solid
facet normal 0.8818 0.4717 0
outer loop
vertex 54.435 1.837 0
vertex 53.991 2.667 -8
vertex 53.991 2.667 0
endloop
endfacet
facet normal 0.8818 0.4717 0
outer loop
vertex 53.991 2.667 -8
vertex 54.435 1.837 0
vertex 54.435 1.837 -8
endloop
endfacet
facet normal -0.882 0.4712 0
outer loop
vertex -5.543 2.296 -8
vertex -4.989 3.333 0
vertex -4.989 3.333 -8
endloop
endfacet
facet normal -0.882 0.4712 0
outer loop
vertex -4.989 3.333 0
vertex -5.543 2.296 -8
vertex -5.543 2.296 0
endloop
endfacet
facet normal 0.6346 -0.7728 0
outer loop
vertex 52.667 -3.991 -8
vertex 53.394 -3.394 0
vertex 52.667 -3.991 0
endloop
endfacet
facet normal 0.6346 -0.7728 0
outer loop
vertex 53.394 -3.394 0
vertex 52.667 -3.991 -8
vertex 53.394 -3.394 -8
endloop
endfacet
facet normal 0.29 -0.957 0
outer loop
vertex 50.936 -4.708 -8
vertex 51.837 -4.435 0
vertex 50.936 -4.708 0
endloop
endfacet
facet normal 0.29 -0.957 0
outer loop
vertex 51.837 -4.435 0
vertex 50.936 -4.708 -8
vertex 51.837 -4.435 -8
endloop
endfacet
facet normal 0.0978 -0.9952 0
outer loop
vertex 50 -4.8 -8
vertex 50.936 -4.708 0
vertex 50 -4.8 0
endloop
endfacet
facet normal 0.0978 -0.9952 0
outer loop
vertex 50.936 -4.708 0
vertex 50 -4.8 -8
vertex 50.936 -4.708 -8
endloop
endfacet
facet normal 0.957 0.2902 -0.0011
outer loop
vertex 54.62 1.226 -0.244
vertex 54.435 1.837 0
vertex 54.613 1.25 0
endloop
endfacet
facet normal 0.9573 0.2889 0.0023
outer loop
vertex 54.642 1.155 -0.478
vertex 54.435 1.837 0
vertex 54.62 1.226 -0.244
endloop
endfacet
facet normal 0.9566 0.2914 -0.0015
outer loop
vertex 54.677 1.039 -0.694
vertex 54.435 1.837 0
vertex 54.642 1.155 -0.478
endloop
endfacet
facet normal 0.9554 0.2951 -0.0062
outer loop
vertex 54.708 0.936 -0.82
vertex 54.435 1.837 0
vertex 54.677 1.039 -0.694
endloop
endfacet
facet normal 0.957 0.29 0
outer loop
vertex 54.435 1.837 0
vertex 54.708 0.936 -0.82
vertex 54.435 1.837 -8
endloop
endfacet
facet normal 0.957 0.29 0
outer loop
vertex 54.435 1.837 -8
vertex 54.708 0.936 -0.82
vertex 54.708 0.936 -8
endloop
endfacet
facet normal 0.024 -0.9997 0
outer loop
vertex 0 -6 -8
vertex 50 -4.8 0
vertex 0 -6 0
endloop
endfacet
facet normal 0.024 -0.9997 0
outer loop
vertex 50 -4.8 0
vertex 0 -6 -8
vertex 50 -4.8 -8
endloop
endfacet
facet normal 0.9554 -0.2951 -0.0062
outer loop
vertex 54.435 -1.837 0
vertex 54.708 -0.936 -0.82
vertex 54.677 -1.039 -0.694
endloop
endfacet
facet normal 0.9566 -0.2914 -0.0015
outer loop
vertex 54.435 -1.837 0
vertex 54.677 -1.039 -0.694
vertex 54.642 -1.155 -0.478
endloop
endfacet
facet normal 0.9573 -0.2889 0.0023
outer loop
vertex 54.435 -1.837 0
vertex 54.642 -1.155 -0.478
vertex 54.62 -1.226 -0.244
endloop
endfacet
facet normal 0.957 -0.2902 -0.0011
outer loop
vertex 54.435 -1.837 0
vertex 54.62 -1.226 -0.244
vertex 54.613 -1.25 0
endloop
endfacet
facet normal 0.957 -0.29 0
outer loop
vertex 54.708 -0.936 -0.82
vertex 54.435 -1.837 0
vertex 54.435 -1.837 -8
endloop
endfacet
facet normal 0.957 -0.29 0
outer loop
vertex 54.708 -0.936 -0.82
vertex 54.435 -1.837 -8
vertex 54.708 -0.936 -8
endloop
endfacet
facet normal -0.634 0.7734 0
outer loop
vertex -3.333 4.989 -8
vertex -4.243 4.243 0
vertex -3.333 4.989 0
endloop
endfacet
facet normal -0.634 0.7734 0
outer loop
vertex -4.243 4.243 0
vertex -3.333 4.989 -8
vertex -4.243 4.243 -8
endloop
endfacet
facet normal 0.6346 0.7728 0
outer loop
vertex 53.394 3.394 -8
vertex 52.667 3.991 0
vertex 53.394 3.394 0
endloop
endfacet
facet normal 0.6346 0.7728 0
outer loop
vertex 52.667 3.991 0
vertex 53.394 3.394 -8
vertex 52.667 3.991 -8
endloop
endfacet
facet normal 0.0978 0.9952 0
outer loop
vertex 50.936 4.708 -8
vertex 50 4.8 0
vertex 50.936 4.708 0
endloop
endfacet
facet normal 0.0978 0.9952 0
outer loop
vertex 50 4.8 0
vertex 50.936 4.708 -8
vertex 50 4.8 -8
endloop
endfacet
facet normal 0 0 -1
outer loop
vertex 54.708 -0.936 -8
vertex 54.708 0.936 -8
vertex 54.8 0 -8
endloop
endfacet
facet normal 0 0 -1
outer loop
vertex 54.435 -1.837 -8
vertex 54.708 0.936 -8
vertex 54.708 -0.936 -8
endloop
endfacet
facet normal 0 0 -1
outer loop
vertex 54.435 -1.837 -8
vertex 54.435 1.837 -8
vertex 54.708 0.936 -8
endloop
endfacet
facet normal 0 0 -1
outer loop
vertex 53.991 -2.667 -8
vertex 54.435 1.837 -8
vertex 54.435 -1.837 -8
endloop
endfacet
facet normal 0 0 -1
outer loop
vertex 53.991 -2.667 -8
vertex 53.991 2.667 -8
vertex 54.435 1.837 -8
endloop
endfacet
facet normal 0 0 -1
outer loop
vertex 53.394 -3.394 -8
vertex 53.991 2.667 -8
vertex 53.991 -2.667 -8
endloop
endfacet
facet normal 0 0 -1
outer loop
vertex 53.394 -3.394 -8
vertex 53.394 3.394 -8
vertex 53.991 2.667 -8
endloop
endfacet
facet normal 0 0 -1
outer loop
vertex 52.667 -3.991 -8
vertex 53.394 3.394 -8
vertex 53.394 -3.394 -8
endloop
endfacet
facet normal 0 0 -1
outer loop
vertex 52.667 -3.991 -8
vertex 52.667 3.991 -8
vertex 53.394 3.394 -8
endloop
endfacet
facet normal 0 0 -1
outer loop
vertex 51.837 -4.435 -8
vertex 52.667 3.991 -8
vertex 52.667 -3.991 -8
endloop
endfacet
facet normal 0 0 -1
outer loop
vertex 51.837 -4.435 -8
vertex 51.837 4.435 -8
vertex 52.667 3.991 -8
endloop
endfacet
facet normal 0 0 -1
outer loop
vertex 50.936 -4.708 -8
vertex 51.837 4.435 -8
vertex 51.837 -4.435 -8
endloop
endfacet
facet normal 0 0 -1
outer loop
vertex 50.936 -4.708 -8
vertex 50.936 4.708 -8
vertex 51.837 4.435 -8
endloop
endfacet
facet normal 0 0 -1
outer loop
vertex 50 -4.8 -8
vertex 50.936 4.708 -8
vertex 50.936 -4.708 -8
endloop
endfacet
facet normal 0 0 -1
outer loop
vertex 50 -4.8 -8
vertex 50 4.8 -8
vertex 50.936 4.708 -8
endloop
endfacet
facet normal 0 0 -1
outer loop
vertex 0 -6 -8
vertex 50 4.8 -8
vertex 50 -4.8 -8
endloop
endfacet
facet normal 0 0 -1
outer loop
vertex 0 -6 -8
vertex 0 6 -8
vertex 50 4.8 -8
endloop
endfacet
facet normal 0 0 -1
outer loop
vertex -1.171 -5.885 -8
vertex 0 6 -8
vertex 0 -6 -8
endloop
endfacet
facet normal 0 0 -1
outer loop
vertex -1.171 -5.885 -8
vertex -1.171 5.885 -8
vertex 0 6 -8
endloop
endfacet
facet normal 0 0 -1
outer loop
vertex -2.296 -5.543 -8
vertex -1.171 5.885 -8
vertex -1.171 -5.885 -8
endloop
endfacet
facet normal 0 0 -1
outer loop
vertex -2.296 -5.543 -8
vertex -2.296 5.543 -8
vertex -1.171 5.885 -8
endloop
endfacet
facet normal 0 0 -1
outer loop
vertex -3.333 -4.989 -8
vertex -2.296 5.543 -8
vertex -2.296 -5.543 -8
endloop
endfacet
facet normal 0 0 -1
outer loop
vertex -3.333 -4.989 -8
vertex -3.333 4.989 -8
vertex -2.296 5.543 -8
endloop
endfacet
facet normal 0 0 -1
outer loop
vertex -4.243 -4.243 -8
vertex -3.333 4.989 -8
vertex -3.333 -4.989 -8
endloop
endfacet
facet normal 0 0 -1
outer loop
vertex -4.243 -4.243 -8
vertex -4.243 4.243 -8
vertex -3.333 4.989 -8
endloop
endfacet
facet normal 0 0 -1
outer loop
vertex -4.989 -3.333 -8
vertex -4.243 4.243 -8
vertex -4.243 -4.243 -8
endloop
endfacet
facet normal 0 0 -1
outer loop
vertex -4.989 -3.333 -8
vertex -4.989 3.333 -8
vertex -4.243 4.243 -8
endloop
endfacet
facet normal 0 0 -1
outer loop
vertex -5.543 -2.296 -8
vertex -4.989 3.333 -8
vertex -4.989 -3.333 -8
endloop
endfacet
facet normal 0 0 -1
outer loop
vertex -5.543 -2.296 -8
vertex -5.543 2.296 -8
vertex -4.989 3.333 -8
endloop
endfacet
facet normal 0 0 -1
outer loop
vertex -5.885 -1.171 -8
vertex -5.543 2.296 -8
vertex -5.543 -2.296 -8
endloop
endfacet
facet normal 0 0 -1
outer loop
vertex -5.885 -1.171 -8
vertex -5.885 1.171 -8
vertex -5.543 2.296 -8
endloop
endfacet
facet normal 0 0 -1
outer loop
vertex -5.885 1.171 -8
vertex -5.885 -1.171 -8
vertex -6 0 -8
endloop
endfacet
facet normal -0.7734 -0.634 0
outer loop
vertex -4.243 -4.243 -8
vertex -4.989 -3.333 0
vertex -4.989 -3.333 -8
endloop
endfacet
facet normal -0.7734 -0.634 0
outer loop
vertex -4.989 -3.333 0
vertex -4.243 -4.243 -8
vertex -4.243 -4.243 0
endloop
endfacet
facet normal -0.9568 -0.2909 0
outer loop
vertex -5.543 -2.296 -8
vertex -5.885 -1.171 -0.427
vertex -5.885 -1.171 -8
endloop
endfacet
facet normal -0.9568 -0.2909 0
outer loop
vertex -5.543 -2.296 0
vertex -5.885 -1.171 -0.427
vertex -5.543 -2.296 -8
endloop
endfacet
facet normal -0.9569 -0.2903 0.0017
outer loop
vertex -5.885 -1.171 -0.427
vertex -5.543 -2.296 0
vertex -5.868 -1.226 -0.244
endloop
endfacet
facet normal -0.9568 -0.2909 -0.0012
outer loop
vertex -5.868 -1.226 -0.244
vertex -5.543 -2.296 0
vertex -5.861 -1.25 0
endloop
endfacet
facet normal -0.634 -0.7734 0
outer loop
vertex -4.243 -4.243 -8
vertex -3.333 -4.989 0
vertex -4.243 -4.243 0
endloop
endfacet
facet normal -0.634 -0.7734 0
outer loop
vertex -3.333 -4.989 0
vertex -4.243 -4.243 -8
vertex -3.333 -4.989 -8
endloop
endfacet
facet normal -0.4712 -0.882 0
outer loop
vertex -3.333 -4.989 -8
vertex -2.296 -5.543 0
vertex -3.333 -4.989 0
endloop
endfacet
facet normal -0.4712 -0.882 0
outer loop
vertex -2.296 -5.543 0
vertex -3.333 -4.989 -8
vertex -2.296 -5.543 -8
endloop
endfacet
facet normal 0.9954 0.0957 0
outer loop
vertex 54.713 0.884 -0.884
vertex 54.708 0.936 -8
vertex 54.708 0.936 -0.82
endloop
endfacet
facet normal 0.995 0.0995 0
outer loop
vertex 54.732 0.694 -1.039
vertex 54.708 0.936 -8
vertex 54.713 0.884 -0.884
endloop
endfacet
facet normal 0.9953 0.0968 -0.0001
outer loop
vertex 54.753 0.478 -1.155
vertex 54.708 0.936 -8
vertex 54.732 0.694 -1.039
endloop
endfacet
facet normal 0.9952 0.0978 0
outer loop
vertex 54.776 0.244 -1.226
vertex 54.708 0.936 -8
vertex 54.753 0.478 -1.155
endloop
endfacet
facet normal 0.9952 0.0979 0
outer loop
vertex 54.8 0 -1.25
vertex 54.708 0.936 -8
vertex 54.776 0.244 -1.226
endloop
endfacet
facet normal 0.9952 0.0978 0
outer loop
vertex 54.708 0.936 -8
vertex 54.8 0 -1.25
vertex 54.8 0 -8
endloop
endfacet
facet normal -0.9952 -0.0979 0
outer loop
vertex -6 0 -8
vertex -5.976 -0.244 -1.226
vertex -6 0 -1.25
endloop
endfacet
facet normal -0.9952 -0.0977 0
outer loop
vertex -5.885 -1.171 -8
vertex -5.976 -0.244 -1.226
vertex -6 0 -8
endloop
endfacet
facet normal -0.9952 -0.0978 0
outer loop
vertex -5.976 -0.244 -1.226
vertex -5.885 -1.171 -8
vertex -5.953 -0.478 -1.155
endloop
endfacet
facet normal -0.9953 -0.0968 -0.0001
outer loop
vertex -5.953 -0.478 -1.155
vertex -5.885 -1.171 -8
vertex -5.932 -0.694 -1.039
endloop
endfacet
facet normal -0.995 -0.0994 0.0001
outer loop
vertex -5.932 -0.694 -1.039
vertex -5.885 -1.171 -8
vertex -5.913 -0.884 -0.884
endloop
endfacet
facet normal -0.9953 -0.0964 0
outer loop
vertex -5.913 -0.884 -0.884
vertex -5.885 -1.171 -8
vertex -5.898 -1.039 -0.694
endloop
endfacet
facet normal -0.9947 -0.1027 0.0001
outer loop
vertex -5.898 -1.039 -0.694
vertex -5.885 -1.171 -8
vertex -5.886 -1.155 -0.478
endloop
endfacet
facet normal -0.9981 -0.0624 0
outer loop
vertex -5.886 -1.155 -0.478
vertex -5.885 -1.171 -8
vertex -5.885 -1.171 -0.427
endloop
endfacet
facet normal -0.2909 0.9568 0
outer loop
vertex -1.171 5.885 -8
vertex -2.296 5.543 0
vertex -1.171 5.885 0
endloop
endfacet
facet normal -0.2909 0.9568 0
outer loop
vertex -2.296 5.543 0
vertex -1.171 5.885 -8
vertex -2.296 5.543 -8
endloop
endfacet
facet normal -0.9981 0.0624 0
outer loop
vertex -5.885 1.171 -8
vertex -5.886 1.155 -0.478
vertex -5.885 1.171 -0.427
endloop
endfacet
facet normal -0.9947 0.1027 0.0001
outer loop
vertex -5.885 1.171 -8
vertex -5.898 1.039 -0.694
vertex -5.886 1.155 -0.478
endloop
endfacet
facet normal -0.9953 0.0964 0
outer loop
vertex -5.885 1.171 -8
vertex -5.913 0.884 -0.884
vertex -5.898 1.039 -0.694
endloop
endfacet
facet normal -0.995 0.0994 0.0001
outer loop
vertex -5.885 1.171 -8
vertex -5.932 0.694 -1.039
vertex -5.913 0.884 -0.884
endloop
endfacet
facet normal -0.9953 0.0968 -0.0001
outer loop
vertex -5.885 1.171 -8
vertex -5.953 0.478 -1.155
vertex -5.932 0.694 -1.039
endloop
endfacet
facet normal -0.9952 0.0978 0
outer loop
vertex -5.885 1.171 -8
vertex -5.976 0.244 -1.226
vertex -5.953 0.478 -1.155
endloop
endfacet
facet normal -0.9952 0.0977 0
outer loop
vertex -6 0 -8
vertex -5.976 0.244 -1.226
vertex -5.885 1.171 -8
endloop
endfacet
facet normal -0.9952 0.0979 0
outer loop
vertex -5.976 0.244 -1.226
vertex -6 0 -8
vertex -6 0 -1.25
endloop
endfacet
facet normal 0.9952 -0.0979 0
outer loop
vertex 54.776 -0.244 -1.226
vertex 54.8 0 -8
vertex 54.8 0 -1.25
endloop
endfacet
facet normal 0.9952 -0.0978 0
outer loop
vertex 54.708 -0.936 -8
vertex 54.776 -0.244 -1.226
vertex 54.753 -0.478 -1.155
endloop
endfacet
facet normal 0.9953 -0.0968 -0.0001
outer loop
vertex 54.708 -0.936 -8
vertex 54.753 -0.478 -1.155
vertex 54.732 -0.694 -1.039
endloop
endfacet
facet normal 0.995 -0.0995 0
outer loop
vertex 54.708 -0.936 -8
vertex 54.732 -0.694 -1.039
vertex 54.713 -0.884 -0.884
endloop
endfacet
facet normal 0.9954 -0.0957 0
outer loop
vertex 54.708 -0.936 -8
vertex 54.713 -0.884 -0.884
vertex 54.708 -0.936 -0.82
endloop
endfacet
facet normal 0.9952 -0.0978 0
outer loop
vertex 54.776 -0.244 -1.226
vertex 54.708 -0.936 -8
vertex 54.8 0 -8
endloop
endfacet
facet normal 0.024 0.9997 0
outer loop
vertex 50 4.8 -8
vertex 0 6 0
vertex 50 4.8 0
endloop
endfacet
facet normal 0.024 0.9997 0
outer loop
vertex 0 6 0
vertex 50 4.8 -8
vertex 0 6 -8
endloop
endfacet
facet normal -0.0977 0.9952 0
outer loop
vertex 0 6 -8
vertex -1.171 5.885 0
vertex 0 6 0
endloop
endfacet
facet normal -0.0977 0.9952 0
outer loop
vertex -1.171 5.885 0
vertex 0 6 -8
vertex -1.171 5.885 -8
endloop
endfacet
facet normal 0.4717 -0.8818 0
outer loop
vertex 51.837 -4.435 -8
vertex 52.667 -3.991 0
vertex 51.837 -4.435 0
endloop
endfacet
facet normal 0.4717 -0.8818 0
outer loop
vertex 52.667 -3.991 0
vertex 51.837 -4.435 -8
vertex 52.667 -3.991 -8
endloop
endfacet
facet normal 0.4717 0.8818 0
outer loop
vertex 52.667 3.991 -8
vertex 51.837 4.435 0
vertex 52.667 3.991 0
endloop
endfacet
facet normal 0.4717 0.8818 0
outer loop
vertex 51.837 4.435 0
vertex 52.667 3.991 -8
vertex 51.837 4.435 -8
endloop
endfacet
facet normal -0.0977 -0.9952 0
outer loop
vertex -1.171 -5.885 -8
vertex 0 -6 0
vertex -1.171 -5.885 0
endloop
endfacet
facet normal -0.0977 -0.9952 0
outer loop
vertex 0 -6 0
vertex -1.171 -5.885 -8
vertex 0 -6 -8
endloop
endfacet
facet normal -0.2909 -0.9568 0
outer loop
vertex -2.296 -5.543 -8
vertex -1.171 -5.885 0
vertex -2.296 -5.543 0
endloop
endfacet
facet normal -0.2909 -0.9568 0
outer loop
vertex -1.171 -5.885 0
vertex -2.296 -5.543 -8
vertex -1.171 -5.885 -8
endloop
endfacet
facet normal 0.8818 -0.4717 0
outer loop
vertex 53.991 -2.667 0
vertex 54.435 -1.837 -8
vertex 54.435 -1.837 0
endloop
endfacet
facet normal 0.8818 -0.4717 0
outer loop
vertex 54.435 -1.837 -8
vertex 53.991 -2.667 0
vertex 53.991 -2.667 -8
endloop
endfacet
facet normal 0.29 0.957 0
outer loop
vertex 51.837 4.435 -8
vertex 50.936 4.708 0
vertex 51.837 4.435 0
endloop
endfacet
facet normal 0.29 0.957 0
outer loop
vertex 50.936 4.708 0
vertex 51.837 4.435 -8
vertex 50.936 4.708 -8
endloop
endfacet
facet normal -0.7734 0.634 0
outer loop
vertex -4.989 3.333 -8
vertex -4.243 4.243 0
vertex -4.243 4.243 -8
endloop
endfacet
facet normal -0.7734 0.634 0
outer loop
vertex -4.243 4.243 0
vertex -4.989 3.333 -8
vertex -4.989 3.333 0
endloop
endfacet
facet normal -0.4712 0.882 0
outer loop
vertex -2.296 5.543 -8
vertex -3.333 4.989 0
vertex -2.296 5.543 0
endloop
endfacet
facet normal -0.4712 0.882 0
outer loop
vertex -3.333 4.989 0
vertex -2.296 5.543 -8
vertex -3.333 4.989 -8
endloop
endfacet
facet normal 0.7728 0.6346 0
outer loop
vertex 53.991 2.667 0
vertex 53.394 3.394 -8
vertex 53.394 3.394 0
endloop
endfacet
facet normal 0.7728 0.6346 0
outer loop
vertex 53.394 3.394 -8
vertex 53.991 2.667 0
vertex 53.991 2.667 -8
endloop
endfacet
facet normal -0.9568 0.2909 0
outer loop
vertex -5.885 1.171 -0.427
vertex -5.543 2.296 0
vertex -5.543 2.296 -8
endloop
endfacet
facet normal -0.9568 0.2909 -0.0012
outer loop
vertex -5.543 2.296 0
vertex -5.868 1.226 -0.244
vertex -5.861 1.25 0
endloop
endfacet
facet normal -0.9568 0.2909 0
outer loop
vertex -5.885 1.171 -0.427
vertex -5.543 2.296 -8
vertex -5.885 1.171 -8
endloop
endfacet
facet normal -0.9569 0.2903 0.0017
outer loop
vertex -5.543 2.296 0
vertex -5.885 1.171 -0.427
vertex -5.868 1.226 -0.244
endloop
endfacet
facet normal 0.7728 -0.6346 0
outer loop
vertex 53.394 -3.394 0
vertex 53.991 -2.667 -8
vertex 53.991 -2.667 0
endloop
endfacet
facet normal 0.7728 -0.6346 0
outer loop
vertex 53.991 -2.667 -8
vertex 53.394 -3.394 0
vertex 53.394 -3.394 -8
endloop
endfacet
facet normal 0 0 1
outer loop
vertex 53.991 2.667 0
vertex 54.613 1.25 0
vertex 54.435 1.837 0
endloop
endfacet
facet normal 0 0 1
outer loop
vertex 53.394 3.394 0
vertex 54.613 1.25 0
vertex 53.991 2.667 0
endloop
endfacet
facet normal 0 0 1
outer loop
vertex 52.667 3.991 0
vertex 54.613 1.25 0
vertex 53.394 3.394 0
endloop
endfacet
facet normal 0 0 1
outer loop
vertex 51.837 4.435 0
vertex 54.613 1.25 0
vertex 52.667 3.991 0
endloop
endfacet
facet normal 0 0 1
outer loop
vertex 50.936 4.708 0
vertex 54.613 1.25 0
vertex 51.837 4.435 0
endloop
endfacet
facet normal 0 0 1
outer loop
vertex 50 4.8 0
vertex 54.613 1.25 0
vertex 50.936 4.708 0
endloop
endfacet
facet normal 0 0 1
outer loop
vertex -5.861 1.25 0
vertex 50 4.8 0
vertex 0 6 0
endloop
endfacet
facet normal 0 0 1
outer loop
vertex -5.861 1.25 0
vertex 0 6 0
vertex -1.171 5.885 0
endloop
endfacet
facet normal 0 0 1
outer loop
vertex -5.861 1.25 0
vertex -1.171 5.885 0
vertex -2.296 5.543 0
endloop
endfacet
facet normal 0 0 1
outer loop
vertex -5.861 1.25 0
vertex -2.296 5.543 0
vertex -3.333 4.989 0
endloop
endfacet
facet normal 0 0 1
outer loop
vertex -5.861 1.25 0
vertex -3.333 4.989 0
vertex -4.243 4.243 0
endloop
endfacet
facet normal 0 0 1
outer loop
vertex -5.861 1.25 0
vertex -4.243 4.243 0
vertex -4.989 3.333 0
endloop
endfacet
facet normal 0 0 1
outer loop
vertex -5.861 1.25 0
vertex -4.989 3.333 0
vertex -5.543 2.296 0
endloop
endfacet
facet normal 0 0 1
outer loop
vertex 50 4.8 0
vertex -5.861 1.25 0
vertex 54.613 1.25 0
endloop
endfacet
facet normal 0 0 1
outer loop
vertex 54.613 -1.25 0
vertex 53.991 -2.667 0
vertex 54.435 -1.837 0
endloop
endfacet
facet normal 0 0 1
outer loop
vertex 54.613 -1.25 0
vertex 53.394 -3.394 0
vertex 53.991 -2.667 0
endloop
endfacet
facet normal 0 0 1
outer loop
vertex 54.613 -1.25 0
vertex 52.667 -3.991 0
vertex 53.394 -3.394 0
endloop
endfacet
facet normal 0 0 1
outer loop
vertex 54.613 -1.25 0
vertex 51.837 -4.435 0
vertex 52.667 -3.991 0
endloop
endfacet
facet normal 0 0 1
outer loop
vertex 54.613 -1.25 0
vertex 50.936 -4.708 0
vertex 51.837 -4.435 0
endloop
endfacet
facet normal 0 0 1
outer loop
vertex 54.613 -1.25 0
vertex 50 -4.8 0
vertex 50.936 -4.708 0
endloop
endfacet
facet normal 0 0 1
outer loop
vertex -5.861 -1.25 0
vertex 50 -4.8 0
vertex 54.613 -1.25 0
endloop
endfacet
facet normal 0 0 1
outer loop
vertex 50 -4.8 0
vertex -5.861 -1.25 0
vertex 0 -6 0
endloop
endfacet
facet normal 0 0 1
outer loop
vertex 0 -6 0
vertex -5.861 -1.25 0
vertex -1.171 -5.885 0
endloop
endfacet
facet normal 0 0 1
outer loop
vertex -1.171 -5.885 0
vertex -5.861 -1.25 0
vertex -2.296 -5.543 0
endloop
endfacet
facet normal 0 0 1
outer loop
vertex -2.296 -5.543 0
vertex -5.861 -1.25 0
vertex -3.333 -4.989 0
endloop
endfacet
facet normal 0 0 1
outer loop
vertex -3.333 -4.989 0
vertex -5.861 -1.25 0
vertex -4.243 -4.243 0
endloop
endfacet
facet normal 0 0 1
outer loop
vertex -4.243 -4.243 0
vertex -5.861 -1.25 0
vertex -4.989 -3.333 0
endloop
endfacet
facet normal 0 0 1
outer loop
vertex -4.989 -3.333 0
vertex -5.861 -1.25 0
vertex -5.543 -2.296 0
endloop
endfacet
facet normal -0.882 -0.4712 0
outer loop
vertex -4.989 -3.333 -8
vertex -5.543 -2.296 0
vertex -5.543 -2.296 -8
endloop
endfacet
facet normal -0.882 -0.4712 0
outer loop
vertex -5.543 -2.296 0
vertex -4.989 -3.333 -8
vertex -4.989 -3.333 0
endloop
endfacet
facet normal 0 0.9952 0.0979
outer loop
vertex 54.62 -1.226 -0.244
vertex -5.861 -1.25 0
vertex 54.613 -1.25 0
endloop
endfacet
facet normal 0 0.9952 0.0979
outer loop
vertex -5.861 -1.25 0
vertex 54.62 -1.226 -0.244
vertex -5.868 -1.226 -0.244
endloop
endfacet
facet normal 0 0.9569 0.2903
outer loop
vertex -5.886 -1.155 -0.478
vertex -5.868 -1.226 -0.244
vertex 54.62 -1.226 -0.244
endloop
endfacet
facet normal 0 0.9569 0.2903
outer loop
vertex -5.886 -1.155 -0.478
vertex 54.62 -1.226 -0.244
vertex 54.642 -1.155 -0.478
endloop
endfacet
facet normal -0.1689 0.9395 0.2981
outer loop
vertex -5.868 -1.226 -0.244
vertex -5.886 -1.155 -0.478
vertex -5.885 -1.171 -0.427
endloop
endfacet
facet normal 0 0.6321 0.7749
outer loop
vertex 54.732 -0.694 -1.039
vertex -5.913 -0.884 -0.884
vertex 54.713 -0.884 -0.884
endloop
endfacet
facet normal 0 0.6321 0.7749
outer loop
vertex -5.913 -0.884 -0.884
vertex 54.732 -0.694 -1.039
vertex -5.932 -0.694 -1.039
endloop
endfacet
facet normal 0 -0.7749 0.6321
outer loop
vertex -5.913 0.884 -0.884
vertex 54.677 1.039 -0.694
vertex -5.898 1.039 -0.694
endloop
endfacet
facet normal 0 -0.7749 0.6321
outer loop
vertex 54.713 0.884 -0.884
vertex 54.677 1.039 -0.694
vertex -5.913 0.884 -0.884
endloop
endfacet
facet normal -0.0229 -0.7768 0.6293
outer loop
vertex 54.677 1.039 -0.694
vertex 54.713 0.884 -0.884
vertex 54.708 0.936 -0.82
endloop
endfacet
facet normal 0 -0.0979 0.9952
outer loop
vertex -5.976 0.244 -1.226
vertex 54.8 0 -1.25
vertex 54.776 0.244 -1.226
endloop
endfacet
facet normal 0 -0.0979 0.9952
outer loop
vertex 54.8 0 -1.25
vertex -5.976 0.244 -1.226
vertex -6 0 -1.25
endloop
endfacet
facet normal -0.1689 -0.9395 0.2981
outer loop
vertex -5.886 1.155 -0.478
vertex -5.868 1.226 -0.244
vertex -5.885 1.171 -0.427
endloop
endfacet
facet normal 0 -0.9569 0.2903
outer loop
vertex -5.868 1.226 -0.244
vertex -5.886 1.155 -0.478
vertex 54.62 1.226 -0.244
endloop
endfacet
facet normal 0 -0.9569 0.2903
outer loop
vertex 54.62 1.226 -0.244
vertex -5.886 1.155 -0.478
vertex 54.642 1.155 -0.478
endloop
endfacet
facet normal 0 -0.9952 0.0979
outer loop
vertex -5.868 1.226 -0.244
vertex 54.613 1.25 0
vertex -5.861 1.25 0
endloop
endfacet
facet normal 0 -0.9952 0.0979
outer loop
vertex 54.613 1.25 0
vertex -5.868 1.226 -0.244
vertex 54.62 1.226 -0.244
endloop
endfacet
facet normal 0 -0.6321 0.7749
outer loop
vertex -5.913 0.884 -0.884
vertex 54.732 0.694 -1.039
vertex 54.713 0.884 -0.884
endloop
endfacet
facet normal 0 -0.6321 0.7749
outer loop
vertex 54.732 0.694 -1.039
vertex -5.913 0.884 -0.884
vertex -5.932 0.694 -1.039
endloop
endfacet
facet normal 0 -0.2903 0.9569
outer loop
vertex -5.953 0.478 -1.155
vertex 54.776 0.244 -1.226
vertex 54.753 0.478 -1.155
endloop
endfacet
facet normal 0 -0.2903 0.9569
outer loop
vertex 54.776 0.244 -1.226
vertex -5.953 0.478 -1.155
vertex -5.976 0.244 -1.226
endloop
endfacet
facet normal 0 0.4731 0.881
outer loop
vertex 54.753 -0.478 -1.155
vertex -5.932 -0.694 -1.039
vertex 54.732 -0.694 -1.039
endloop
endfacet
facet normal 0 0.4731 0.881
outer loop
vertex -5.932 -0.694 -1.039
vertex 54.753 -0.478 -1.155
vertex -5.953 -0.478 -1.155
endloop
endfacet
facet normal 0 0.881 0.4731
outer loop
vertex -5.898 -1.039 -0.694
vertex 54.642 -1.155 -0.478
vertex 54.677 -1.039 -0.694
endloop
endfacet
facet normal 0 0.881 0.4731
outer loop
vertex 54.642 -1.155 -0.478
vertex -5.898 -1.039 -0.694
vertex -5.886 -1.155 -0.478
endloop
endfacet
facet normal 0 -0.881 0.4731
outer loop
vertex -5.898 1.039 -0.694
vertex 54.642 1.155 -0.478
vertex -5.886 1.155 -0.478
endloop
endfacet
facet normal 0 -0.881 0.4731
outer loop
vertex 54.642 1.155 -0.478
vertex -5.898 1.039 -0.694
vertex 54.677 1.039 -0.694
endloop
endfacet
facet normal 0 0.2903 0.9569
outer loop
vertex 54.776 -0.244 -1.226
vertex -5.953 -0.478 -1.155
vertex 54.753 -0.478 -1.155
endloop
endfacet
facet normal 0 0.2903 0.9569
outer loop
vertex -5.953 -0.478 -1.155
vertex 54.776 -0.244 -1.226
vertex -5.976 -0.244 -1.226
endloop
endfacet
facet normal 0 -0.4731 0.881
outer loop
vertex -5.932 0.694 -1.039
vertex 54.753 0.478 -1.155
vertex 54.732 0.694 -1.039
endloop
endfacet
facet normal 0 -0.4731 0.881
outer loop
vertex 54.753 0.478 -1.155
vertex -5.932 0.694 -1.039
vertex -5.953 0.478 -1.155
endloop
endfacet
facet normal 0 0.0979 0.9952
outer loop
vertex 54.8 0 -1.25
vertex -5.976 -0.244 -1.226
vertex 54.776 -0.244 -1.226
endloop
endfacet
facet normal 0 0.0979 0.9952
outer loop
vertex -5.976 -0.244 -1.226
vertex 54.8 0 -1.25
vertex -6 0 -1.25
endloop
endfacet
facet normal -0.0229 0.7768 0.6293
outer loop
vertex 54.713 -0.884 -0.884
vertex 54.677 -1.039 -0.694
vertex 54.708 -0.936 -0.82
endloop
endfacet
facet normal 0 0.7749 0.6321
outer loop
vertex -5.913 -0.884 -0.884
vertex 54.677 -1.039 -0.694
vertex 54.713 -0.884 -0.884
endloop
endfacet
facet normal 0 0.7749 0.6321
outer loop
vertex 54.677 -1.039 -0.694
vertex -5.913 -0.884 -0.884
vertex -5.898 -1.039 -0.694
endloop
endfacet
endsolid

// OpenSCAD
// COBRA Finger Segment - PROXIMAL
// Length: 50.0mm, Width: 12mm

$fn = 32;

module finger_segment() {
    difference() {
        hull() {
            translate([0, 0, -4])
            cylinder(h=8, d=12, center=true);
            
            translate([50.0, 0, -4])
            cylinder(h=8, d=9.600000000000001, center=true);
        }
        
        // Tendon channel
        translate([25.0, 0, 0])
        rotate([0, 90, 0])
        cylinder(h=52.0, d=2.5, center=true);
        
        // Pivot holes
        translate([0, 0, 0])
        rotate([0, 90, 0])
        cylinder(h=14, d=2.5, center=true);
        
        translate([50.0, 0, 0])
        rotate([0, 90, 0])
        cylinder(h=14, d=2.5, center=true);
    }
}

finger_segment();
